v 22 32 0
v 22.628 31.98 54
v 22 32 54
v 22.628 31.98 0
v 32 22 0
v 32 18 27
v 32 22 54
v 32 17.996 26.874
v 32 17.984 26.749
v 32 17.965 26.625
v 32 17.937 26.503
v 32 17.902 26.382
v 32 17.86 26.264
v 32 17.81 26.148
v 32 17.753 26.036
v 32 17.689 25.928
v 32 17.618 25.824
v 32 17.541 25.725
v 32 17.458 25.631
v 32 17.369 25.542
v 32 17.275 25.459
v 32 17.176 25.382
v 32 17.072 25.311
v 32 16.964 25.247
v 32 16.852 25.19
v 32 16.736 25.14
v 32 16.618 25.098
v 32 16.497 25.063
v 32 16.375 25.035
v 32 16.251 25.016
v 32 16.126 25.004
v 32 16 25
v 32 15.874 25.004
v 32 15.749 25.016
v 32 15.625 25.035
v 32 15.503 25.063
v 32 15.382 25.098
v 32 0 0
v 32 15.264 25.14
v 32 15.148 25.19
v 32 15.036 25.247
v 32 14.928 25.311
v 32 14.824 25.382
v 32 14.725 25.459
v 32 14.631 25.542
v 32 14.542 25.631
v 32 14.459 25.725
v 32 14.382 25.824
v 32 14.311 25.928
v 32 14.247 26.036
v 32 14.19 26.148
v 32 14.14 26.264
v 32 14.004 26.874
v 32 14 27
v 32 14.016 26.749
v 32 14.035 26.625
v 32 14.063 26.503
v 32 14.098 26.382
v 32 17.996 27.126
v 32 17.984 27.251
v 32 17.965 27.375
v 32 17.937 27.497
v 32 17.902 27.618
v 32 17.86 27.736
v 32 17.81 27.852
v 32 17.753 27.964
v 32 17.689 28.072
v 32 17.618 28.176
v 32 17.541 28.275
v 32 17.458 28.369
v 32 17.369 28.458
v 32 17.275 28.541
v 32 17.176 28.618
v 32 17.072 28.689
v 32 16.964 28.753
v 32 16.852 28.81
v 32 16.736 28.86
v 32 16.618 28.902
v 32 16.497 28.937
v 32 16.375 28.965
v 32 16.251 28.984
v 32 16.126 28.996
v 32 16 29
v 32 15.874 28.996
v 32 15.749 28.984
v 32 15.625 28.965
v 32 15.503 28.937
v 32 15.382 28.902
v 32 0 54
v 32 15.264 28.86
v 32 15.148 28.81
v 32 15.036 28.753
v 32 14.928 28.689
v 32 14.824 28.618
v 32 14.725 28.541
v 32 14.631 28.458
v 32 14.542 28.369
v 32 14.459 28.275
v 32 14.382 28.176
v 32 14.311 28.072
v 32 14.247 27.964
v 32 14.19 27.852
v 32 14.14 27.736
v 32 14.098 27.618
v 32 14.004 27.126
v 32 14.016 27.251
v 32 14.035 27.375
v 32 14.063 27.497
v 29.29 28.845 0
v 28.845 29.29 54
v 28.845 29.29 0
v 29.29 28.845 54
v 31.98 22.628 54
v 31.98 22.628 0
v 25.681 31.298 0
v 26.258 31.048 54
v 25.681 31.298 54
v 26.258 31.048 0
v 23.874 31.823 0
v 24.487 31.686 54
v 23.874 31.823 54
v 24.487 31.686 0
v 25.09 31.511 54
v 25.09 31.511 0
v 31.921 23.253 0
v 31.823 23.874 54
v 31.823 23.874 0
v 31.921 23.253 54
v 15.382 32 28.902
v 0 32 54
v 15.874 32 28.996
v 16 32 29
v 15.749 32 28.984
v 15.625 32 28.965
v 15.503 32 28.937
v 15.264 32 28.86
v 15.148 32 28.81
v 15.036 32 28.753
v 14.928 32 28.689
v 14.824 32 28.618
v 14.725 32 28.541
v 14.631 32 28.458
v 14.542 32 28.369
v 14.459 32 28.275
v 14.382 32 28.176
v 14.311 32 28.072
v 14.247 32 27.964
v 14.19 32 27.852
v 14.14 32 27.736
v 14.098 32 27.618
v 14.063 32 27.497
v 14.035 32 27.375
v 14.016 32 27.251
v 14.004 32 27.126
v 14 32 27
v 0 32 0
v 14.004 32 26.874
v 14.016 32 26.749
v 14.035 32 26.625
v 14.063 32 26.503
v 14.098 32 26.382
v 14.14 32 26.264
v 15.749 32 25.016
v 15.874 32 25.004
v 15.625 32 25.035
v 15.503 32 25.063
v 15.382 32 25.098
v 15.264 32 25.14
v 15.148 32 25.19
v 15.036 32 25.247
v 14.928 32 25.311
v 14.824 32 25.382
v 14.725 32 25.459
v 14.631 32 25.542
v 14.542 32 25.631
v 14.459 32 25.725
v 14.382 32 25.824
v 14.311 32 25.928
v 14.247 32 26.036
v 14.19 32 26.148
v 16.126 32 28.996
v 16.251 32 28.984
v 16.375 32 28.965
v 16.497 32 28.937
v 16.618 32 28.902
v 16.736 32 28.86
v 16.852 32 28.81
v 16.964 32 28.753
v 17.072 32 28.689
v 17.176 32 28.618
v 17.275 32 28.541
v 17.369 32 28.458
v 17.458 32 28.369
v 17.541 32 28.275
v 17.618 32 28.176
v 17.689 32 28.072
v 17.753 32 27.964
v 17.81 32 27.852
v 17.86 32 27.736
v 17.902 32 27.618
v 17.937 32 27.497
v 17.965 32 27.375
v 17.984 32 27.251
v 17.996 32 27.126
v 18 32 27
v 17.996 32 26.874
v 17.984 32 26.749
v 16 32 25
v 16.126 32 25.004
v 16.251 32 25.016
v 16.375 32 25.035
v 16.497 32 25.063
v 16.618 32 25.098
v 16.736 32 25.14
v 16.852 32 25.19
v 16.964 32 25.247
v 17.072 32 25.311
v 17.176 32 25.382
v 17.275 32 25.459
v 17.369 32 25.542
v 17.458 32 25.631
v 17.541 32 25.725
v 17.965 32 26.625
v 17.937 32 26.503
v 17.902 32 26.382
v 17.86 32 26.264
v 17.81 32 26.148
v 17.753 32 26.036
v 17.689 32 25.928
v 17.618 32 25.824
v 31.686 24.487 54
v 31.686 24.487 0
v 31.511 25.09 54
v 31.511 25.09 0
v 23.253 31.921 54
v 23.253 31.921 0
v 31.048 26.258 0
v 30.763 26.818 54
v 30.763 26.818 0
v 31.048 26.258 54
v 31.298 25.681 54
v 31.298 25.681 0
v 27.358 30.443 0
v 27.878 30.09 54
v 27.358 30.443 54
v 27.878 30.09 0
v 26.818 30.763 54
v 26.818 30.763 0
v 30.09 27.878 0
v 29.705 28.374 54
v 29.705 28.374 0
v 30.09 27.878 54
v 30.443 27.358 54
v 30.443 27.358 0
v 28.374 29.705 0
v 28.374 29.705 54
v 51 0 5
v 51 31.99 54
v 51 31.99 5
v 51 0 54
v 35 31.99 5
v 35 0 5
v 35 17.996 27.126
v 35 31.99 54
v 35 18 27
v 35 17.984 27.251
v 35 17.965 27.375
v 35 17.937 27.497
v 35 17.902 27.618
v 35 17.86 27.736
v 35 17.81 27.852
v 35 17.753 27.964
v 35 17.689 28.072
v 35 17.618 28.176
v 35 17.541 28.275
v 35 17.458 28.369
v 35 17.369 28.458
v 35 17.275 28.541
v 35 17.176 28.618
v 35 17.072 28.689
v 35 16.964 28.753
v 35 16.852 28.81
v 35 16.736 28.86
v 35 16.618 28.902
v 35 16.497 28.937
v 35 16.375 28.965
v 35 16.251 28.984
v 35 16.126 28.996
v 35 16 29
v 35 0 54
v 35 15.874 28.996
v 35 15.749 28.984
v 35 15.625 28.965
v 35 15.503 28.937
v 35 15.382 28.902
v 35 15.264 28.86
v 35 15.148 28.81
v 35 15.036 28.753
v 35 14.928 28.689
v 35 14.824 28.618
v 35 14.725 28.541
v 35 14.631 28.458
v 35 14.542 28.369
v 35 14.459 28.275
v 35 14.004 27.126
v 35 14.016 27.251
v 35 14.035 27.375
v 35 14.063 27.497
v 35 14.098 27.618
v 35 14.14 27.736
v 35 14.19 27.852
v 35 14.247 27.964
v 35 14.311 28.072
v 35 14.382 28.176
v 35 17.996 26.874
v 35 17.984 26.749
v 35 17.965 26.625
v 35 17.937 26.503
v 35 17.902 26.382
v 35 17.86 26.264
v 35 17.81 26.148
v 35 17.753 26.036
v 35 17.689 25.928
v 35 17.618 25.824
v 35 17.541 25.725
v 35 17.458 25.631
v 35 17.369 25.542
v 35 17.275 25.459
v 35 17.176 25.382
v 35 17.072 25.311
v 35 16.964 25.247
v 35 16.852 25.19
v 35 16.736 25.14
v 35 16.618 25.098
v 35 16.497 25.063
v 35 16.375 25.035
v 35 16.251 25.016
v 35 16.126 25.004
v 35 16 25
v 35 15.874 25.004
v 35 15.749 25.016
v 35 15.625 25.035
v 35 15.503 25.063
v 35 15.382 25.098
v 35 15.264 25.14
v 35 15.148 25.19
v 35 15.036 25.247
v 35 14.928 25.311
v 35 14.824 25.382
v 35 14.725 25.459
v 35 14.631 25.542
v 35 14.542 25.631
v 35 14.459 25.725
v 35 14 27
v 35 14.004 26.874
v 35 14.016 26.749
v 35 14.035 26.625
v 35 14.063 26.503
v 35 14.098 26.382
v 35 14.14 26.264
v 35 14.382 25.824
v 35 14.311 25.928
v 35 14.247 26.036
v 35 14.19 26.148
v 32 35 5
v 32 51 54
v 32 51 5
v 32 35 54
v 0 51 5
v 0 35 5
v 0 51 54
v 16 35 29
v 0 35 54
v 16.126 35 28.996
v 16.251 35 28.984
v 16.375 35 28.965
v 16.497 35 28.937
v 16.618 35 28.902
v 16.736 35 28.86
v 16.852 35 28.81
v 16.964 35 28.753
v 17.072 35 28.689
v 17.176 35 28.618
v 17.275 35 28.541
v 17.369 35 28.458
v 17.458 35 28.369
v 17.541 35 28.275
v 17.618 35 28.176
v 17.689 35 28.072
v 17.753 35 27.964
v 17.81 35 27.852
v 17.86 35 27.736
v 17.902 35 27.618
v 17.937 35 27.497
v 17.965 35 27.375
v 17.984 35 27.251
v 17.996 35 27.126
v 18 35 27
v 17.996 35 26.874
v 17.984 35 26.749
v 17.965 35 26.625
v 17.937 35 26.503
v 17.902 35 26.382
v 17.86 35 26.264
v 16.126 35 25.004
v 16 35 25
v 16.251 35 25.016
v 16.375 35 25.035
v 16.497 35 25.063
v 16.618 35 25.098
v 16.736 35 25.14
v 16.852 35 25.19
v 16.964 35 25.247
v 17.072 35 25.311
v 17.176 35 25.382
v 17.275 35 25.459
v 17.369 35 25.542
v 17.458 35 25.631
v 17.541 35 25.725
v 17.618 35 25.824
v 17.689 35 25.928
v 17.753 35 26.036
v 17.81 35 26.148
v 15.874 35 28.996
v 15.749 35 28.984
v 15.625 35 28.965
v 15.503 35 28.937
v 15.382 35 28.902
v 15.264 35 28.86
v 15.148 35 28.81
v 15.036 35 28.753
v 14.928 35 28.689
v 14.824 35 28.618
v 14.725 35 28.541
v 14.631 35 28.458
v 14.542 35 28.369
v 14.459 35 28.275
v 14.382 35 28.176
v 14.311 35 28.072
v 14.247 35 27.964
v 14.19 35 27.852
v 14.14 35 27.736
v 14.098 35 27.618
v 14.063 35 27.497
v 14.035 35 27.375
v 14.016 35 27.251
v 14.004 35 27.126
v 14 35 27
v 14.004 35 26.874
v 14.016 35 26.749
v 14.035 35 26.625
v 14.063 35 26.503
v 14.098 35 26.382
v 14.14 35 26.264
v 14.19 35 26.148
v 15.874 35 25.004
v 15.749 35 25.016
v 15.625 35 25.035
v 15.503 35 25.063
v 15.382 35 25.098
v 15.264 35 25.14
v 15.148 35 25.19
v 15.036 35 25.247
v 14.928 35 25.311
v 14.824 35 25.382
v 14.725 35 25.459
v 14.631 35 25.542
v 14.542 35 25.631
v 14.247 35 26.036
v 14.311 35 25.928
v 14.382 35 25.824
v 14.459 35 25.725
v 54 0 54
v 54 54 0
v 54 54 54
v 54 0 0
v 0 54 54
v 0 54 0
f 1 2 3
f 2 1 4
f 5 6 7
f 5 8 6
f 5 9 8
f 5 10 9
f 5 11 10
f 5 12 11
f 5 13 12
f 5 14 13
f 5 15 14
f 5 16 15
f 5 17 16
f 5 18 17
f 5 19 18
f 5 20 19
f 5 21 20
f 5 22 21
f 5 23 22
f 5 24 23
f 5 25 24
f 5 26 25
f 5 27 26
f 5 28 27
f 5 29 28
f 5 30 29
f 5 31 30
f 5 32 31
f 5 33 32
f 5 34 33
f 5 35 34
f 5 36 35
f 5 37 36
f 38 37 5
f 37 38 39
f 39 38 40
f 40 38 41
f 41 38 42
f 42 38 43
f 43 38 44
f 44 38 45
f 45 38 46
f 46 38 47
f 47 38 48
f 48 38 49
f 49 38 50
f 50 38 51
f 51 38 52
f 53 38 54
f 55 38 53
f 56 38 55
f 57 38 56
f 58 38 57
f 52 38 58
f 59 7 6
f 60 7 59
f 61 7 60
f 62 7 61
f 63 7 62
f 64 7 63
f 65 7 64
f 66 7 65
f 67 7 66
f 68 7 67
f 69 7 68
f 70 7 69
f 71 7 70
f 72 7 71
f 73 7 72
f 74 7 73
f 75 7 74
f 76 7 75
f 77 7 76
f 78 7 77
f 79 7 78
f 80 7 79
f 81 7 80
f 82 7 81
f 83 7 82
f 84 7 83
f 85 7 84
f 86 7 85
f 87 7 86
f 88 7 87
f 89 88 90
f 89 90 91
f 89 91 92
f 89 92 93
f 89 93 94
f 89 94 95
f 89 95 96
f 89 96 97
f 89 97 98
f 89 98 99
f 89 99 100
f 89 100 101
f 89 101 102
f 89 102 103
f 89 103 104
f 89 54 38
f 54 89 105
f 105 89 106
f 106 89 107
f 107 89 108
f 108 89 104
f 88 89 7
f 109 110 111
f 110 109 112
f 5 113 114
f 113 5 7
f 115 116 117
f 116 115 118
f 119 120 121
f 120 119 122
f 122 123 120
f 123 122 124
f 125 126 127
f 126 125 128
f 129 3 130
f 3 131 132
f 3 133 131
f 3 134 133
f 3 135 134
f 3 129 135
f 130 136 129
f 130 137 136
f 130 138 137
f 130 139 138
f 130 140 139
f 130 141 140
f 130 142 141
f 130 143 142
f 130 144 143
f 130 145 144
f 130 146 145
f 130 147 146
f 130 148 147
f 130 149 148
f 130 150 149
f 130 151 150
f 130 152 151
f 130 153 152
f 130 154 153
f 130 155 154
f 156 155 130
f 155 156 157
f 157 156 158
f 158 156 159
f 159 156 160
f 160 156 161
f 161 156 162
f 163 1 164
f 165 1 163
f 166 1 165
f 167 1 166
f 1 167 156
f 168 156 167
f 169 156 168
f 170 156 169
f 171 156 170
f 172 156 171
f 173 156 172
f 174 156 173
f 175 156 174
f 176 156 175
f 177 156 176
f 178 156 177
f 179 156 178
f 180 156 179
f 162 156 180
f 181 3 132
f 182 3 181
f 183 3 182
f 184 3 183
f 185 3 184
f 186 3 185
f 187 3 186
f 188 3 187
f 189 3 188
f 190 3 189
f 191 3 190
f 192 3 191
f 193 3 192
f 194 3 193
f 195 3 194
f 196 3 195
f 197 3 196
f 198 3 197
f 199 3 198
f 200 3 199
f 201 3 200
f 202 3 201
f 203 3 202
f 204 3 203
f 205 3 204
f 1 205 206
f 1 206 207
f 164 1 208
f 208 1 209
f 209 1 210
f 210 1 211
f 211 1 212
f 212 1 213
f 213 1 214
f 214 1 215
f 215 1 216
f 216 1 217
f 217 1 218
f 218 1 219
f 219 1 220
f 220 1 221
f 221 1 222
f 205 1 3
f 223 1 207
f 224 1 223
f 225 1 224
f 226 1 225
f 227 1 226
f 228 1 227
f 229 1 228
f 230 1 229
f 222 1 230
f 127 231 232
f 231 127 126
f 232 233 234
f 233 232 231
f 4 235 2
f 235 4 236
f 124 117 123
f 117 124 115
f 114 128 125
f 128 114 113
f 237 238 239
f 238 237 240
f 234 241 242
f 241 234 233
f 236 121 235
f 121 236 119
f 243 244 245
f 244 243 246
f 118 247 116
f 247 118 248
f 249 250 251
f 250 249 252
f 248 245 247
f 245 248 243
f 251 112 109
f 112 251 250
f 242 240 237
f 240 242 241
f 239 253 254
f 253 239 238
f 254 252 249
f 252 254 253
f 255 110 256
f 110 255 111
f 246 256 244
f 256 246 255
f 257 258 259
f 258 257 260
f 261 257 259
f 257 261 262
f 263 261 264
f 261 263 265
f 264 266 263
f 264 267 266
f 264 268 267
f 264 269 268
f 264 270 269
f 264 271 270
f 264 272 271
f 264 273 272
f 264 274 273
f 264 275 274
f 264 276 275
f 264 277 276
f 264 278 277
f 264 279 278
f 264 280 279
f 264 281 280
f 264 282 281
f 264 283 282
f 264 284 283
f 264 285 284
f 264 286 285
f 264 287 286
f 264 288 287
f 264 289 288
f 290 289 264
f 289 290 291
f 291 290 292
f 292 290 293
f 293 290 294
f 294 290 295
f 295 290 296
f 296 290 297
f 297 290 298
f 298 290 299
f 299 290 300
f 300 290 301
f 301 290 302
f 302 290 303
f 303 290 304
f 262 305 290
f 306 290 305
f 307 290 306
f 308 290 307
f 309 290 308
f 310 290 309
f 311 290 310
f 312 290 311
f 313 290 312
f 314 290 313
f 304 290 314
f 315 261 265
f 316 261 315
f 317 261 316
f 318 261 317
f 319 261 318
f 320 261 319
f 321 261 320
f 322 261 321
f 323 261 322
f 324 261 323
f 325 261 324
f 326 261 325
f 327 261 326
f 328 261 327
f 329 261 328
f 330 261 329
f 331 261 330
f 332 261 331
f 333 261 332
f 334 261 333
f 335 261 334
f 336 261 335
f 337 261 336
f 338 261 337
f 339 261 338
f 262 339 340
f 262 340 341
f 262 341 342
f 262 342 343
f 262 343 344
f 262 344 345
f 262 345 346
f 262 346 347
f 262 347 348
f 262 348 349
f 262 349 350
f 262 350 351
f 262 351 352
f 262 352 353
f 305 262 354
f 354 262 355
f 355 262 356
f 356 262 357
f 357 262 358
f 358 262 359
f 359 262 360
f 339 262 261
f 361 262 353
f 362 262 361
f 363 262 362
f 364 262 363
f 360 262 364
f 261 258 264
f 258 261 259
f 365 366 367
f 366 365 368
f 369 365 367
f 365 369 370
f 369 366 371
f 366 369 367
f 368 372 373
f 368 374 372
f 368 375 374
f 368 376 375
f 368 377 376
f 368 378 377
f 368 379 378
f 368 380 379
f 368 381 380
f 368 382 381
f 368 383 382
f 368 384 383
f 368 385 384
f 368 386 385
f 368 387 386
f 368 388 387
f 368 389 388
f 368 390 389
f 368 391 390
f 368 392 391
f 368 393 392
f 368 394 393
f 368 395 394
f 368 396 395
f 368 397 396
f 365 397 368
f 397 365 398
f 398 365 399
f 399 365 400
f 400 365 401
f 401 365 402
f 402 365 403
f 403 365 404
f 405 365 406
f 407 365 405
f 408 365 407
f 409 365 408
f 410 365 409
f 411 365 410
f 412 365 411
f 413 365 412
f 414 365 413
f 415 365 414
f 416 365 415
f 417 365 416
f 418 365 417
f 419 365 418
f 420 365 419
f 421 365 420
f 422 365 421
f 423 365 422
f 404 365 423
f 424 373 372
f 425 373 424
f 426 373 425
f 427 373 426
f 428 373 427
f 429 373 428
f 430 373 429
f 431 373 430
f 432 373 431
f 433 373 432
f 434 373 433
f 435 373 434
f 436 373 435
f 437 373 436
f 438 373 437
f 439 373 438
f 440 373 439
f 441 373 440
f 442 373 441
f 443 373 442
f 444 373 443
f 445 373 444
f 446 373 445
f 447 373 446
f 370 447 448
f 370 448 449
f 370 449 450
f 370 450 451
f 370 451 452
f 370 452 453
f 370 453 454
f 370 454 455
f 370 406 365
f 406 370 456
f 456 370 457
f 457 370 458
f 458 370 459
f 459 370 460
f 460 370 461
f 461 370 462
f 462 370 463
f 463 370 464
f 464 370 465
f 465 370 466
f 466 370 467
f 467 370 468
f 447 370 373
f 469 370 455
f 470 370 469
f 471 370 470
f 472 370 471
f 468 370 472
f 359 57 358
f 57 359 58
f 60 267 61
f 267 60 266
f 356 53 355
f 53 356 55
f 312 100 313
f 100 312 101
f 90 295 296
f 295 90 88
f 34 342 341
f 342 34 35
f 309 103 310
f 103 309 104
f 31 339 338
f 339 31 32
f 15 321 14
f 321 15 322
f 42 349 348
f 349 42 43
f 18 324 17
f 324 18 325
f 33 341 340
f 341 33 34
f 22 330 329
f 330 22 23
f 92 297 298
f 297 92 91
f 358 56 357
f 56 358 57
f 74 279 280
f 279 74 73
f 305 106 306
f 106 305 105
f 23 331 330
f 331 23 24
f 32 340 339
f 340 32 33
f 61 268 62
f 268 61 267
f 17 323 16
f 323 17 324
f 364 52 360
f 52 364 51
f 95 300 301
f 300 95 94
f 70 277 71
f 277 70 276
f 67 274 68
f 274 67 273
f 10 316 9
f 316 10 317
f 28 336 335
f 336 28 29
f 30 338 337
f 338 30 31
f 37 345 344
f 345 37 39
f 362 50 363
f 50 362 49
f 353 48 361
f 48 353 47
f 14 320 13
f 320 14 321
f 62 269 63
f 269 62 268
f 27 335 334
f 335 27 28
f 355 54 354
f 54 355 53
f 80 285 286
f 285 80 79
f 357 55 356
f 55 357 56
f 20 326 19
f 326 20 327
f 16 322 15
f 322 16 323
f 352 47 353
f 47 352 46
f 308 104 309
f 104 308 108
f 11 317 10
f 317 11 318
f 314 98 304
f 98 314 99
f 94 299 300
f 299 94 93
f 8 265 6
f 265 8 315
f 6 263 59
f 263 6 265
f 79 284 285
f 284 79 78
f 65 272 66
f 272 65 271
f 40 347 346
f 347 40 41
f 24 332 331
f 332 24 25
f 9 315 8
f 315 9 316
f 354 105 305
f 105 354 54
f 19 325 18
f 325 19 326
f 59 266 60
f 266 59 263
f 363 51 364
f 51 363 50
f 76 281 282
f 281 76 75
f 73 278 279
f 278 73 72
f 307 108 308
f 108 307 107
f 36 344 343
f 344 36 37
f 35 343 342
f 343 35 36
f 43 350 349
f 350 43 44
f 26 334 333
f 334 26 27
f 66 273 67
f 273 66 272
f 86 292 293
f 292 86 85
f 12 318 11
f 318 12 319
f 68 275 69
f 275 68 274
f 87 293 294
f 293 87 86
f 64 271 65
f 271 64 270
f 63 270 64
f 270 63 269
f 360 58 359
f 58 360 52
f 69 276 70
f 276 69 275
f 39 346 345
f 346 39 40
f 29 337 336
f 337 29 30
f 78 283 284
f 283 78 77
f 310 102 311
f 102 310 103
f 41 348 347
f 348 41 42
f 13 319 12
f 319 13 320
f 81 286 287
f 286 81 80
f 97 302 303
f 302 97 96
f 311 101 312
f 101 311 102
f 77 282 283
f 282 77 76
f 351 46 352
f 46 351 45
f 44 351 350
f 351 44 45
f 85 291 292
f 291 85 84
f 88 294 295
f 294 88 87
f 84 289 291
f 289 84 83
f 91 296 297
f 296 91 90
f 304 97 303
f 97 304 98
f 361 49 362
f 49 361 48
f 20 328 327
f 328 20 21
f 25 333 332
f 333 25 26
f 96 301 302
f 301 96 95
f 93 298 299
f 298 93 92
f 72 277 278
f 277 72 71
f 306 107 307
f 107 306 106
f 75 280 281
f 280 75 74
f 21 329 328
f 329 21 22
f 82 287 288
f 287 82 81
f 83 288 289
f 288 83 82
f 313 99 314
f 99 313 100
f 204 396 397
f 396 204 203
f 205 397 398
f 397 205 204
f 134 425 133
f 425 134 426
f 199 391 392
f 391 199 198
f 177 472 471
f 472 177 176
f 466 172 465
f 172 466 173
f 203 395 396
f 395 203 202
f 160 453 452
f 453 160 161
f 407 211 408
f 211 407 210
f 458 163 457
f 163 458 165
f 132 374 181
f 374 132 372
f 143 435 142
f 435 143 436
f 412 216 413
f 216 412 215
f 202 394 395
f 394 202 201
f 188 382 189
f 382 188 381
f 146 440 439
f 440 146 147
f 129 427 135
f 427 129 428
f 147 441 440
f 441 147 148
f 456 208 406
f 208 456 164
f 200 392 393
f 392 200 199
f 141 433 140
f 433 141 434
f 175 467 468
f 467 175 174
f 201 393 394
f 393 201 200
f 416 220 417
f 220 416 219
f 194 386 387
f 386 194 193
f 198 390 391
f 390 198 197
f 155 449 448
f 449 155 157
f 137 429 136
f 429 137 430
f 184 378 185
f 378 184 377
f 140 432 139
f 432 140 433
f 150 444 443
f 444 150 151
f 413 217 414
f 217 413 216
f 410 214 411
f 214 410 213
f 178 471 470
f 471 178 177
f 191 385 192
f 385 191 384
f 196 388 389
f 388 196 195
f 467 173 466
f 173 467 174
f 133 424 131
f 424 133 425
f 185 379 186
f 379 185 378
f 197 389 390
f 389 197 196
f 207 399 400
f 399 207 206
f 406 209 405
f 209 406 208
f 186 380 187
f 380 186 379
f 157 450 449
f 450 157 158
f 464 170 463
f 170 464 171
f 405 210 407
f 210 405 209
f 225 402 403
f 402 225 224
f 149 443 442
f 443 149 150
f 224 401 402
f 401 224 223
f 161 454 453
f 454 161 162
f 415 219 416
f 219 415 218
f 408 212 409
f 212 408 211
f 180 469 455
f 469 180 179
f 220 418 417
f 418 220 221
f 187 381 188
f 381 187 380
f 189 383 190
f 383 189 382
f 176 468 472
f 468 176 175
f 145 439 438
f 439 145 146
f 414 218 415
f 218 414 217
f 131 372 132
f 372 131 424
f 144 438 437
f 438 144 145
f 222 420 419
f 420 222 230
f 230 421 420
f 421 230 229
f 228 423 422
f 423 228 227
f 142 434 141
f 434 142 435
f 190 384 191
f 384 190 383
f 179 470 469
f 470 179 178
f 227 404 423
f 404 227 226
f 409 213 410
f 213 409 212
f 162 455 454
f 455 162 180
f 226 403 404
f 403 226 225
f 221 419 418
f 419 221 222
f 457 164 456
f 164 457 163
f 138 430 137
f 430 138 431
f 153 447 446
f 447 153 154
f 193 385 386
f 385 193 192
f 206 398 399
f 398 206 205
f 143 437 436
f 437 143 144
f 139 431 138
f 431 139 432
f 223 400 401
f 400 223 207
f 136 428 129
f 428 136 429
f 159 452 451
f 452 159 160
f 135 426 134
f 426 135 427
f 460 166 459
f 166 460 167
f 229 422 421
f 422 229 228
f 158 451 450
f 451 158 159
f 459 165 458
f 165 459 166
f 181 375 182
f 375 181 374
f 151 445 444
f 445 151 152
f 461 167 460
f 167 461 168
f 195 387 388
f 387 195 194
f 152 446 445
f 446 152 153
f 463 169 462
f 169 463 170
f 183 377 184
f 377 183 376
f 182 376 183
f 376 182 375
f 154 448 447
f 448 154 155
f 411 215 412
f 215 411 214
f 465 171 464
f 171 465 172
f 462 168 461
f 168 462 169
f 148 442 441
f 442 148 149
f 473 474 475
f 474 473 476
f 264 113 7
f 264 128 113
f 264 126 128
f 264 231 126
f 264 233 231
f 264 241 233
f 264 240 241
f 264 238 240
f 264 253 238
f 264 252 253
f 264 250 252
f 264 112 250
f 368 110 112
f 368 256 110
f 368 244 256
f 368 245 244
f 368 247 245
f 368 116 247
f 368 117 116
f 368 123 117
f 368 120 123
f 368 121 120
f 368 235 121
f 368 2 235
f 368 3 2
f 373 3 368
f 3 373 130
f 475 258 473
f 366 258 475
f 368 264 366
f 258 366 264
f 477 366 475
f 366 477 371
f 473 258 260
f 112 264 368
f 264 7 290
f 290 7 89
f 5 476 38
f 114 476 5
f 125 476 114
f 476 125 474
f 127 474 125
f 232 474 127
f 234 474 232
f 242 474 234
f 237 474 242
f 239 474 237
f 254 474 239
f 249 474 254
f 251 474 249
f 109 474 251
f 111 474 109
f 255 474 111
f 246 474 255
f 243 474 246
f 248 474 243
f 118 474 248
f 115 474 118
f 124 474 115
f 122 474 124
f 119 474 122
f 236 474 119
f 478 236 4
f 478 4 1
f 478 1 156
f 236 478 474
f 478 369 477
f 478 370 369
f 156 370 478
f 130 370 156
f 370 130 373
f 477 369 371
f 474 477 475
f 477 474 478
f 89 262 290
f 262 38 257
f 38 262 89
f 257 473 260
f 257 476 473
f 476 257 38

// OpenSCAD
/***********************************************************************************************************************************
'Shelfie' Do it yourself shelf and storage designer by: Mike Thompson 10/4/2015, http://www.thingiverse.com/mike_linus
Based on original concept idea from Milla Niskakoski http://www.thingiverse.com/thing:681835

v2 18/1/2017 - Added 'no internal bracing' option to allow panels to butt together and a corner radius cut-off option for wall mounting

Licensing: This work is licensed under a Creative Commons Attribution-NonCommercial-ShareAlike 3.0 Australia License.  Further 
information is available here - http://creativecommons.org/licenses/by-nc-sa/3.0/au/deed.en_GB

I was very impressed with the simplicity and practicality of Milla's initial design, but ran into some major limitations when trying to
construct my own shelves.  The key issues I encountered were:
- No customisable thicknesses. Like may others, I wanted to use the scrap wood I had lying around rather than purchase new material.
- No mixed thicknesses. I wanted to use glass shelves with wood sides, but it wasn't possible unless they were the same thickness.
- No wall mounting bracket option.  Particularly for tall shelves, this is an important safety feature.
- No ability to alter the size of the bracket or the wall thickness to increase strength.
- No ability to attach a shelf midspan.  This is a big issue if you have long sections and want to add a shelf in-between.

Shelfie provides full control over all parameters so you can mix materials of any thickness, add wall mounts, alter the bracket size,
mid mount shelves, change the screw hole size etc. 

Note: incremental 0.01 values added to fix diplay anomalies when using preview (F5)

Instructions: select the bracket type and options to suit your particular materials below. 
************************************************************************************************************************************/

/**************************************************************************
Enter the values corresponding to your bracket requirements in this section
***************************************************************************/

/* [Bracket Options] */

//Bracket Type
bracket_type="L";//[L,T,X,L Foot,T Foot]
//Bracket cube size
bracket_size = 54;//54
//Thickness of Panel 1
panel_thickness = 16;
//Thickness of Panel 2
panel2_thickness = 16;
//Flip bracket for opposite orientation
flip = "false";//[false,true]
//Thickness of panel walls
wall_thickness = 3;
//Thickness of base
base_thickness=5;
//Hole radius (set to 0 to remove)
hole_radius=2;
//Allow pass through for mid-span brackets
pass_through="false";//[false,true]
//Internal bracing (If removed, all internal bracing will be removed allowing panels to butt together)  
bracing="true";//[true,false]
//Add wall mount plate
wall_mount = "false";//[false,true]
//Corner radius of wall mount. Note: '0' will create a square corner. It is not recommended to set a radius higher than: (bracket_size - (wall_thickness *2) + panel_thickness)
wall_mount_corner_radius = 0;
/* [Hidden] */
$fn=100;

panel_depth=bracket_size-panel_thickness-(wall_thickness*2);
panel_depth2=bracket_size-panel2_thickness-(wall_thickness*2);

module L_piece()
{
    difference()
    {
        cube(bracket_size);
        union()
        {
            hull()//corner cutout
            {
                if(wall_mount=="true")
                {
                    translate([0,0,wall_thickness])
                    {
                        translate([-0.001,-0.001,-0.001])cube([10,10,bracket_size]);
                        translate([bracket_size-panel_thickness-(wall_thickness*2)-10,0,-0.01])cube([10,10,bracket_size]);
                        translate([-0.01,bracket_size-panel2_thickness-(wall_thickness*2)-10,-0.01])cube([10,10,bracket_size]);
                        translate([bracket_size-panel_thickness-(wall_thickness*2)-10,bracket_size-panel2_thickness-(wall_thickness*2)-10,0])cylinder(h=bracket_size,r=10);
                    }
                }
                else
                {
                    translate([-0.001,-0.001,-0.001])cube([10,10,bracket_size+0.01]);
                    translate([bracket_size-panel_thickness-(wall_thickness*2)-10,-0.01,-0.01])cube([10,10,bracket_size+0.02]);
                    translate([-0.01,bracket_size-panel2_thickness-(wall_thickness*2)-10,-0.01])cube([10,10,bracket_size+0.02]);
                    translate([bracket_size-panel_thickness-(wall_thickness*2)-10,bracket_size-panel2_thickness-(wall_thickness*2)-10,0])cylinder(h=bracket_size+0.02,r=10);
                }
            }
            if(wall_mount=="true")
            {
                translate([bracket_size/3,bracket_size/3,0])cylinder(r=hole_radius,h=wall_thickness+0.01); //cut hole in wall mount area
                
                difference() //cut corner radius from base wall mount area
                {
                    cube([wall_mount_corner_radius,wall_mount_corner_radius,wall_thickness]);
                    translate([wall_mount_corner_radius,wall_mount_corner_radius,0])cylinder(r=wall_mount_corner_radius, h= wall_thickness);
                }
            }
            //panel cutout
            if (bracing == "true")
            {
                translate([bracket_size-wall_thickness-panel_thickness,-0.01,base_thickness])cube([panel_thickness,panel_depth2,bracket_size-base_thickness+0.01]);
            }
            else
            {
                translate([bracket_size-wall_thickness-panel_thickness,-0.01,base_thickness])cube([panel_thickness,panel_depth2+wall_thickness+0.01,bracket_size-base_thickness+0.01]);            
            }
            //panel2 cutout
            if (pass_through=="true")
            {
                translate([-0.01,bracket_size-wall_thickness-panel2_thickness,base_thickness])cube([bracket_size+0.02,panel2_thickness,bracket_size-base_thickness+0.01]);
            }
            else
            {
                if (bracing == "true")
                {
                    translate([-0.01,bracket_size-wall_thickness-panel2_thickness,base_thickness])cube([panel_depth+0.01,panel2_thickness,bracket_size-base_thickness+0.01]);
                }
                else
                {
                    translate([-0.01,bracket_size-wall_thickness-panel2_thickness,base_thickness])cube([bracket_size-wall_thickness,panel2_thickness,bracket_size-base_thickness+0.01]);                
                }
            }
            //inside holes
            translate([panel_depth,panel_depth2/2,bracket_size/2])rotate([0,90,0])cylinder(h=wall_thickness+0.01,r=hole_radius);
            translate([panel_depth/2,panel_depth2+wall_thickness,bracket_size/2])rotate([90,0,0])cylinder(h=wall_thickness++0.01,r=hole_radius);
        }
    }
}

module T_piece()
{
    difference()
    {
        union()
        {
            L_piece();
            translate([(bracket_size*2)-(wall_thickness*2)-panel_thickness,0,0])mirror(0,1,0)L_piece();
        }
        union()
        {
            //repunch holes
            translate([panel_depth-0.5,panel_depth2/2,bracket_size/2])rotate([0,90,0])cylinder(h=(wall_thickness*2)+panel_thickness+1,r=hole_radius);
            //repunch internal walls if corner_salid is false
            if (bracing == "false" && pass_through == "false")
            {
                translate([-0.01,bracket_size-wall_thickness-panel2_thickness,base_thickness])cube([bracket_size+0.01,panel2_thickness,bracket_size-base_thickness+0.01]);
            }
        }
    }
}

module X_piece()
{
    difference()
    {
        union()
        {
            T_piece();
            translate([(bracket_size*2)-(wall_thickness*2)-panel_thickness,(bracket_size*2)-(wall_thickness*2)-panel2_thickness,0])rotate([0,0,180])T_piece();
        }
        union()
        {
            //repunch holes
            translate([panel_depth/2,panel_depth+panel_thickness+(wall_thickness*2),bracket_size/2])rotate([90,0,0])cylinder(h=(wall_thickness*2)+panel2_thickness+1,r=hole_radius);
            translate([(panel_depth/2)+bracket_size,panel_depth+panel_thickness+(wall_thickness*2),bracket_size/2])rotate([90,0,0])cylinder(h=(wall_thickness*2)+panel2_thickness+1,r=hole_radius);
            //repunch internal walls if corner_salid is false
            if (bracing == "false" && pass_through == "false")
            {
                translate([bracket_size-wall_thickness-panel_thickness,-0.01,base_thickness])cube([panel_thickness,bracket_size+0.01,bracket_size-base_thickness+0.01]);
            }
        }
    }
}

module L_foot()
{
    L_piece();
    translate([bracket_size,bracket_size+(bracket_size*0.60),0])mirror(0,0,1)rotate([90,0,0])
    hull()
    {
        cube(30);
        translate([0,0,bracket_size*0.60])cube([bracket_size,bracket_size,1]);
    }
}

module T_foot()
{
    T_piece();
    translate([bracket_size-wall_thickness-(panel_thickness/2),bracket_size+(bracket_size*0.60),0])mirror(0,0,1)rotate([90,0,0])
    hull()
    {
       translate([-15,0,0])cube(30);
       translate([-bracket_size/2,0,bracket_size*0.60])cube([bracket_size,bracket_size,1]);
    }
}

if (bracket_type=="L")
{
    if(flip=="true")
    {
        mirror()L_piece();
    }
    else
    {
        L_piece();
    }
}
if (bracket_type=="T")
{
    T_piece();
}
if (bracket_type=="X")
{
    X_piece();
}
if (bracket_type=="L Foot")
{
    if(flip=="true")
    {
        mirror()L_foot();
    }
    else
    {
        L_foot();
    }
}
if (bracket_type=="T Foot")
{
    T_foot();
}
